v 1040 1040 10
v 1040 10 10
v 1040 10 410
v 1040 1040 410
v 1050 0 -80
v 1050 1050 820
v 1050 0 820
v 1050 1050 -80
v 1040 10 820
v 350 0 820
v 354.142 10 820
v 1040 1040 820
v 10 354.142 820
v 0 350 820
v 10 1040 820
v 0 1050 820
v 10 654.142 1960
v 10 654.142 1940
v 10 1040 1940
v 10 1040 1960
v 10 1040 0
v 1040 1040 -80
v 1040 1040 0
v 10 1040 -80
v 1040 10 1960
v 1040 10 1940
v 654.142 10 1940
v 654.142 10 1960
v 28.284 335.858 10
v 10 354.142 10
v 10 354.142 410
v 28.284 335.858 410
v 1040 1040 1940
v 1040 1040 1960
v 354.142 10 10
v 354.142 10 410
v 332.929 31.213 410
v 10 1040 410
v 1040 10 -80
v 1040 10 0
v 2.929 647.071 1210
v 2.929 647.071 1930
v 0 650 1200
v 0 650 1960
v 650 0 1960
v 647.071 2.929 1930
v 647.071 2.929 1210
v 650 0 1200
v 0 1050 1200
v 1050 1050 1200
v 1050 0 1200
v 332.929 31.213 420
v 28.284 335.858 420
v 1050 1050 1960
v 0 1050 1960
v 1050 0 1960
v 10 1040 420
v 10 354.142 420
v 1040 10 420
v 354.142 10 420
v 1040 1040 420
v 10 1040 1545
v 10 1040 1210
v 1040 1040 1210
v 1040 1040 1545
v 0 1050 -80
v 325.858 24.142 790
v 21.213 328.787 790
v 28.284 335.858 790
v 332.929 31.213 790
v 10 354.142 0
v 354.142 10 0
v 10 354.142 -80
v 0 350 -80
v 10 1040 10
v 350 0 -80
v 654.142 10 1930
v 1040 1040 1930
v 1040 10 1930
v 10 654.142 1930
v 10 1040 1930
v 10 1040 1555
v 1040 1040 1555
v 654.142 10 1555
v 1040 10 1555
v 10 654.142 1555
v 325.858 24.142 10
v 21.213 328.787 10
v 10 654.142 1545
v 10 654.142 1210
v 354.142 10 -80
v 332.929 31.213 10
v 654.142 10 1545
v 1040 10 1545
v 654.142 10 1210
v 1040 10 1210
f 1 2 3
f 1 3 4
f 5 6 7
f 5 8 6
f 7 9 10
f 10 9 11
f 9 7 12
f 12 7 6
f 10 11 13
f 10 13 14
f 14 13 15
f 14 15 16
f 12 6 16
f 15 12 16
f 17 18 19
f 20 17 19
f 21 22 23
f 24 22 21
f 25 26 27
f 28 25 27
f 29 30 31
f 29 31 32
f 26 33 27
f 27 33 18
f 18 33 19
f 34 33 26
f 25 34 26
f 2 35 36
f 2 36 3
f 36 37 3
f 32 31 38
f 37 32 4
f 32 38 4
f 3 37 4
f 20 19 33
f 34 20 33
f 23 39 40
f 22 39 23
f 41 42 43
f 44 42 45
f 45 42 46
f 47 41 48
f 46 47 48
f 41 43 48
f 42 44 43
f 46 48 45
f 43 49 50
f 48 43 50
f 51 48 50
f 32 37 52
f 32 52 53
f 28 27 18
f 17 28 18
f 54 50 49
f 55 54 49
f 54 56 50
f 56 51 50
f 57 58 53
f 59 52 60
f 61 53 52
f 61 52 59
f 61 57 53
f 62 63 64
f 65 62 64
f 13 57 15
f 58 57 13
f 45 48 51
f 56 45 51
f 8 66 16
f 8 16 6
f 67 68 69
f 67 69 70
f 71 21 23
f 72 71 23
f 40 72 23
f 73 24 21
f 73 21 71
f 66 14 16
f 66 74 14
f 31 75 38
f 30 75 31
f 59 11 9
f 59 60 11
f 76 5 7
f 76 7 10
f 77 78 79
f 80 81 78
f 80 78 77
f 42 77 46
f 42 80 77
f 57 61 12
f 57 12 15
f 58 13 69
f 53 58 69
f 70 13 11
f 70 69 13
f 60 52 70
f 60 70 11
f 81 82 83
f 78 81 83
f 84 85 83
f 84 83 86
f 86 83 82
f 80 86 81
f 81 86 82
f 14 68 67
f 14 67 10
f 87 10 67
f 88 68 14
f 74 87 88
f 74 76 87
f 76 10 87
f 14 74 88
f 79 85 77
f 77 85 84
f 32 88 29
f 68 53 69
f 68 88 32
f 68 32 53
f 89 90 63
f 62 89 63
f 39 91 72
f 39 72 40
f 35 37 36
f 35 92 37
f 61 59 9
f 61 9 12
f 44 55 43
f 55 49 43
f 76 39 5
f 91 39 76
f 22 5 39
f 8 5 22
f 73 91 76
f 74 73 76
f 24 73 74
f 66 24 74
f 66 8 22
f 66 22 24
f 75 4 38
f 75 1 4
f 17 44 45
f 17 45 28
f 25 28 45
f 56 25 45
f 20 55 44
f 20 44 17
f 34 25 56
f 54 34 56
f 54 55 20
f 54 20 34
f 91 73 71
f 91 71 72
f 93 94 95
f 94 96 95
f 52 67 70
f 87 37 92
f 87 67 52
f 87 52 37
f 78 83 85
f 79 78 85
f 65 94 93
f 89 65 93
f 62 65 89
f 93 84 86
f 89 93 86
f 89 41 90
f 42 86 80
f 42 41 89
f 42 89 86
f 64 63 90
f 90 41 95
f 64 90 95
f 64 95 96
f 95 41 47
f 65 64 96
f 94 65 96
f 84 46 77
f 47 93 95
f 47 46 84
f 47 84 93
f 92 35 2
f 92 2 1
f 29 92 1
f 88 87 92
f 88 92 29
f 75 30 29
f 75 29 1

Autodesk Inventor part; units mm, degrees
sketch "Sketch2" plane through (0, 0, 0) normal (0, 0, 1) x (1, 0, 0)
  line L0 (0, 0) -> (1050, 0) construction
  line L1 (1050, 0) -> (1050, 1050) construction
  line L2 (1050, 1050) -> (0, 1050) construction
  line L3 (0, 1050) -> (0, 0) construction
  line L4 (350, 0) -> (0, 350)
  line L5 (0, 350) -> (0, 1050)
  line L6 (0, 1050) -> (1050, 1050)
  line L7 (1050, 1050) -> (1050, 0)
  line L8 (1050, 0) -> (350, 0)
  dimension "d6" = 45
  dimension "profundidad" = 700
  dimension "d8" = 350
extrude "Extrusion1" add sketch "Sketch2" along normal blind 10
ref_plane "Work Plane1" through (0, 0, -80) normal (0, 0, -1) x (-1, 0, 0)
sketch "Sketch4" plane through (0, 0, -80) normal (0, 0, -1) x (-1, 0, 0)
  line L0 (-1050, 1050) -> (0, 1050) projected
  line L1 (-1050, 0) -> (-1050, 1050) projected
  line L2 (-350, 0) -> (-1050, 0) projected
  line L3 (0, 350) -> (-350, 0) projected
  line L4 (0, 1050) -> (0, 350) projected
  line L5 (-1040, 1040) -> (-10, 1040)
  line L6 (-10, 1040) -> (-10, 354.1421)
  line L7 (-10, 354.1421) -> (-354.1421, 10)
  line L8 (-354.1421, 10) -> (-1040, 10)
  line L9 (-1040, 10) -> (-1040, 1040)
  point P0 (0, 0)
  dimension "d12" = 10
extrude "Extrusion2" add sketch "Sketch4" against normal blind 900
sketch "Sketch5" plane through (350, 0, 820) normal (-0.7071068, -0.7071068, 0) x (-0.7071068, 0.7071068, 0)
  line L0 (0, 900) -> (0, 0) construction
  line L1 (494.9747, 900) -> (494.9747, 0) construction
  line L2 (494.9747, 0) -> (0, 0) construction
  line L3 (490.8326, 810) -> (4.1421, 810) construction
  line L4 (464.9747, 30) -> (34.1421, 30)
  line L5 (34.1421, 30) -> (34.1421, 810)
  line L6 (34.1421, 810) -> (464.9747, 810)
  line L7 (464.9747, 810) -> (464.9747, 30)
  line L8 (4.1421, 810) -> (4.1421, 0) projected
  point P0 (247.4874, 820)
  dimension "d15" = 30
  dimension "d16" = 30
  dimension "d17" = 30
  dimension "d18" = 0
extrude "Extrusion3" cut sketch "Sketch5" against normal up to next
ref_plane "Work Plane2" through (0, 0, 1200) normal (0, 0, 1) x (1, 0, 0)
sketch "Sketch12" plane through (0, 0, 1200) normal (0, 0, 1) x (1, 0, 0)
  line L0 (1050, 1050) -> (0, 1050) projected
  line L1 (0, 1050) -> (0, 350) construction
  line L2 (0, 350) -> (350, 0) construction
  line L3 (350, 0) -> (1050, 0) construction
  line L4 (1050, 0) -> (1050, 1050) projected
  line L5 (0, 650) -> (650, 0)
  line L6 (0, 650) -> (0, 1050)
  line L7 (650, 0) -> (1050, 0)
  point P0 (0, 0)
  dimension "d32" = 400
extrude "Extrusion8" add sketch "Sketch12" along normal blind 10
sketch "Sketch13" plane through (0, 0, 1210) normal (0, 0, 1) x (1, 0, 0)
  line L0 (1050, 1050) -> (0, 1050) projected
  line L1 (0, 1050) -> (0, 650) projected
  line L2 (0, 650) -> (650, 0) projected
  line L3 (650, 0) -> (1050, 0) projected
  line L4 (1050, 0) -> (1050, 1050) projected
  line L5 (10, 1040) -> (1040, 1040)
  line L6 (1040, 1040) -> (1040, 10)
  line L7 (1040, 10) -> (654.1421, 10)
  line L8 (654.1421, 10) -> (10, 654.1421)
  line L9 (10, 654.1421) -> (10, 1040)
  point P0 (0, 0)
  dimension "d35" = 10
extrude "Extrusion9" add sketch "Sketch13" along normal blind 750
sketch "Sketch14" plane through (650, 0, 1960) normal (-0.7071068, -0.7071068, 0) x (-0.7071068, 0.7071068, 0)
  line L0 (915.0967, 750) -> (4.1421, 750) projected
  line L1 (915.0967, 750) -> (915.0967, 0) construction
  line L2 (4.1421, 750) -> (4.1421, 0) construction
  line L3 (915.0967, 30) -> (4.1421, 30)
  line L4 (915.0967, 750) -> (915.0967, 30)
  line L5 (4.1421, 30) -> (4.1421, 750)
  point P0 (459.6194, 1960)
  dimension "d38" = 30
extrude "Extrusion10" cut sketch "Sketch14" against normal up to next
sketch "Sketch15" plane through (647.0711, 2.9289, 1930) normal (0, 0, -1) x (-0.7071068, -0.7071068, 0)
  line L0 (-10, 0) -> (-10, 910.9545) projected
  line L1 (-282.8427, -272.8427) -> (-10, 0) projected
  line L2 (-1011.1627, 455.4773) -> (-282.8427, -272.8427) projected
  line L3 (-282.8427, 1183.7973) -> (-1011.1627, 455.4773) projected
  line L4 (-10, 910.9545) -> (-282.8427, 1183.7973) projected
  point P0 (459.6194, 455.4773)
  point P1 (0, 10)
  point P2 (0, 900.9545)
extrude "Extrusion11" add sketch "Sketch15" against normal blind 10
ref_plane "Work Plane3" through (1040, 1040, 1555) normal (0, 0, -1) x (-1, 0, 0)
ref_plane "Work Plane4" through (0, 0, 410) normal (0, 0, 1) x (1, 0, 0)
sketch "Sketch16" plane through (1040, 1040, 1555) normal (0, 0, -1) x (-1, 0, 0)
  line L0 (385.8579, -1030) -> (1030, -385.8579) construction
  line L1 (1030, 0) -> (1030, -685.8579) construction
  line L2 (0, 0) -> (1030, 0) construction
  line L3 (0, -1030) -> (0, 0) construction
  line L4 (685.8579, -1030) -> (0, -1030) construction
  line L5 (0, 0) -> (0, -1030) construction
  line L6 (0, -1030) -> (685.8579, -1030) construction
  line L7 (685.8579, -1030) -> (1030, -685.8579) construction
  line L8 (1030, -685.8579) -> (1030, 0) construction
  line L9 (1030, 0) -> (0, 0) construction
  line L10 (385.8579, -1030) -> (1030, -385.8579) projected
  line L11 (1030, -385.8579) -> (1030, 0) projected
  line L12 (1030, -385.8579) -> (1030, 0)
  line L13 (0, 0) -> (1030, 0) projected
  line L14 (1030, 0) -> (0, 0)
  line L15 (-10, -1040) -> (-10, 10) projected
  line L16 (0, 0) -> (0, -1030) projected
  line L17 (0, 0) -> (0, -1030)
  line L18 (0, -1030) -> (385.8579, -1030)
  point P0 (1040, -1040)
  point P1 (0, 0)
  point P2 (-644.1421, 0)
  point P3 (-1030, 385.8579)
  point P4 (-385.8579, 1030)
  point P5 (0, 644.1421)
extrude "Extrusion12" add sketch "Sketch16" along normal blind 10
sketch "Sketch17" plane through (0, 0, 410) normal (0, 0, 1) x (1, 0, 0)
  line L0 (1040, 1040) -> (1040, 10) projected
  line L1 (1040, 10) -> (354.1421, 10) projected
  line L2 (354.1421, 10) -> (10, 354.1421) projected
  line L3 (10, 354.1421) -> (10, 1040) projected
  line L4 (10, 1040) -> (1040, 1040) projected
  point P0 (0, 0)
extrude "Extrusion13" add sketch "Sketch17" along normal blind 10
equation "\"d8\" = 0.5 * profundidad"
equation "\"d12\" = espesor"
equation "\"d15\" = 3 * espesor"
equation "\"d16\" = 3 * espesor"
equation "\"d17\" = 3 * espesor"
equation "\"d33\" = espesor"
equation "\"d35\" = espesor"
equation "\"d38\" = 3 * espesor"
equation "\"d41\" = espesor"
equation "\"d45\" = espesor"
equation "\"d47\" = espesor"
equation "\"d43\" = 0.5 * h_sup"
equation "\"espesor\" = 10"
equation "\"h_sup\" = 750"
properties part number "esquinero"
